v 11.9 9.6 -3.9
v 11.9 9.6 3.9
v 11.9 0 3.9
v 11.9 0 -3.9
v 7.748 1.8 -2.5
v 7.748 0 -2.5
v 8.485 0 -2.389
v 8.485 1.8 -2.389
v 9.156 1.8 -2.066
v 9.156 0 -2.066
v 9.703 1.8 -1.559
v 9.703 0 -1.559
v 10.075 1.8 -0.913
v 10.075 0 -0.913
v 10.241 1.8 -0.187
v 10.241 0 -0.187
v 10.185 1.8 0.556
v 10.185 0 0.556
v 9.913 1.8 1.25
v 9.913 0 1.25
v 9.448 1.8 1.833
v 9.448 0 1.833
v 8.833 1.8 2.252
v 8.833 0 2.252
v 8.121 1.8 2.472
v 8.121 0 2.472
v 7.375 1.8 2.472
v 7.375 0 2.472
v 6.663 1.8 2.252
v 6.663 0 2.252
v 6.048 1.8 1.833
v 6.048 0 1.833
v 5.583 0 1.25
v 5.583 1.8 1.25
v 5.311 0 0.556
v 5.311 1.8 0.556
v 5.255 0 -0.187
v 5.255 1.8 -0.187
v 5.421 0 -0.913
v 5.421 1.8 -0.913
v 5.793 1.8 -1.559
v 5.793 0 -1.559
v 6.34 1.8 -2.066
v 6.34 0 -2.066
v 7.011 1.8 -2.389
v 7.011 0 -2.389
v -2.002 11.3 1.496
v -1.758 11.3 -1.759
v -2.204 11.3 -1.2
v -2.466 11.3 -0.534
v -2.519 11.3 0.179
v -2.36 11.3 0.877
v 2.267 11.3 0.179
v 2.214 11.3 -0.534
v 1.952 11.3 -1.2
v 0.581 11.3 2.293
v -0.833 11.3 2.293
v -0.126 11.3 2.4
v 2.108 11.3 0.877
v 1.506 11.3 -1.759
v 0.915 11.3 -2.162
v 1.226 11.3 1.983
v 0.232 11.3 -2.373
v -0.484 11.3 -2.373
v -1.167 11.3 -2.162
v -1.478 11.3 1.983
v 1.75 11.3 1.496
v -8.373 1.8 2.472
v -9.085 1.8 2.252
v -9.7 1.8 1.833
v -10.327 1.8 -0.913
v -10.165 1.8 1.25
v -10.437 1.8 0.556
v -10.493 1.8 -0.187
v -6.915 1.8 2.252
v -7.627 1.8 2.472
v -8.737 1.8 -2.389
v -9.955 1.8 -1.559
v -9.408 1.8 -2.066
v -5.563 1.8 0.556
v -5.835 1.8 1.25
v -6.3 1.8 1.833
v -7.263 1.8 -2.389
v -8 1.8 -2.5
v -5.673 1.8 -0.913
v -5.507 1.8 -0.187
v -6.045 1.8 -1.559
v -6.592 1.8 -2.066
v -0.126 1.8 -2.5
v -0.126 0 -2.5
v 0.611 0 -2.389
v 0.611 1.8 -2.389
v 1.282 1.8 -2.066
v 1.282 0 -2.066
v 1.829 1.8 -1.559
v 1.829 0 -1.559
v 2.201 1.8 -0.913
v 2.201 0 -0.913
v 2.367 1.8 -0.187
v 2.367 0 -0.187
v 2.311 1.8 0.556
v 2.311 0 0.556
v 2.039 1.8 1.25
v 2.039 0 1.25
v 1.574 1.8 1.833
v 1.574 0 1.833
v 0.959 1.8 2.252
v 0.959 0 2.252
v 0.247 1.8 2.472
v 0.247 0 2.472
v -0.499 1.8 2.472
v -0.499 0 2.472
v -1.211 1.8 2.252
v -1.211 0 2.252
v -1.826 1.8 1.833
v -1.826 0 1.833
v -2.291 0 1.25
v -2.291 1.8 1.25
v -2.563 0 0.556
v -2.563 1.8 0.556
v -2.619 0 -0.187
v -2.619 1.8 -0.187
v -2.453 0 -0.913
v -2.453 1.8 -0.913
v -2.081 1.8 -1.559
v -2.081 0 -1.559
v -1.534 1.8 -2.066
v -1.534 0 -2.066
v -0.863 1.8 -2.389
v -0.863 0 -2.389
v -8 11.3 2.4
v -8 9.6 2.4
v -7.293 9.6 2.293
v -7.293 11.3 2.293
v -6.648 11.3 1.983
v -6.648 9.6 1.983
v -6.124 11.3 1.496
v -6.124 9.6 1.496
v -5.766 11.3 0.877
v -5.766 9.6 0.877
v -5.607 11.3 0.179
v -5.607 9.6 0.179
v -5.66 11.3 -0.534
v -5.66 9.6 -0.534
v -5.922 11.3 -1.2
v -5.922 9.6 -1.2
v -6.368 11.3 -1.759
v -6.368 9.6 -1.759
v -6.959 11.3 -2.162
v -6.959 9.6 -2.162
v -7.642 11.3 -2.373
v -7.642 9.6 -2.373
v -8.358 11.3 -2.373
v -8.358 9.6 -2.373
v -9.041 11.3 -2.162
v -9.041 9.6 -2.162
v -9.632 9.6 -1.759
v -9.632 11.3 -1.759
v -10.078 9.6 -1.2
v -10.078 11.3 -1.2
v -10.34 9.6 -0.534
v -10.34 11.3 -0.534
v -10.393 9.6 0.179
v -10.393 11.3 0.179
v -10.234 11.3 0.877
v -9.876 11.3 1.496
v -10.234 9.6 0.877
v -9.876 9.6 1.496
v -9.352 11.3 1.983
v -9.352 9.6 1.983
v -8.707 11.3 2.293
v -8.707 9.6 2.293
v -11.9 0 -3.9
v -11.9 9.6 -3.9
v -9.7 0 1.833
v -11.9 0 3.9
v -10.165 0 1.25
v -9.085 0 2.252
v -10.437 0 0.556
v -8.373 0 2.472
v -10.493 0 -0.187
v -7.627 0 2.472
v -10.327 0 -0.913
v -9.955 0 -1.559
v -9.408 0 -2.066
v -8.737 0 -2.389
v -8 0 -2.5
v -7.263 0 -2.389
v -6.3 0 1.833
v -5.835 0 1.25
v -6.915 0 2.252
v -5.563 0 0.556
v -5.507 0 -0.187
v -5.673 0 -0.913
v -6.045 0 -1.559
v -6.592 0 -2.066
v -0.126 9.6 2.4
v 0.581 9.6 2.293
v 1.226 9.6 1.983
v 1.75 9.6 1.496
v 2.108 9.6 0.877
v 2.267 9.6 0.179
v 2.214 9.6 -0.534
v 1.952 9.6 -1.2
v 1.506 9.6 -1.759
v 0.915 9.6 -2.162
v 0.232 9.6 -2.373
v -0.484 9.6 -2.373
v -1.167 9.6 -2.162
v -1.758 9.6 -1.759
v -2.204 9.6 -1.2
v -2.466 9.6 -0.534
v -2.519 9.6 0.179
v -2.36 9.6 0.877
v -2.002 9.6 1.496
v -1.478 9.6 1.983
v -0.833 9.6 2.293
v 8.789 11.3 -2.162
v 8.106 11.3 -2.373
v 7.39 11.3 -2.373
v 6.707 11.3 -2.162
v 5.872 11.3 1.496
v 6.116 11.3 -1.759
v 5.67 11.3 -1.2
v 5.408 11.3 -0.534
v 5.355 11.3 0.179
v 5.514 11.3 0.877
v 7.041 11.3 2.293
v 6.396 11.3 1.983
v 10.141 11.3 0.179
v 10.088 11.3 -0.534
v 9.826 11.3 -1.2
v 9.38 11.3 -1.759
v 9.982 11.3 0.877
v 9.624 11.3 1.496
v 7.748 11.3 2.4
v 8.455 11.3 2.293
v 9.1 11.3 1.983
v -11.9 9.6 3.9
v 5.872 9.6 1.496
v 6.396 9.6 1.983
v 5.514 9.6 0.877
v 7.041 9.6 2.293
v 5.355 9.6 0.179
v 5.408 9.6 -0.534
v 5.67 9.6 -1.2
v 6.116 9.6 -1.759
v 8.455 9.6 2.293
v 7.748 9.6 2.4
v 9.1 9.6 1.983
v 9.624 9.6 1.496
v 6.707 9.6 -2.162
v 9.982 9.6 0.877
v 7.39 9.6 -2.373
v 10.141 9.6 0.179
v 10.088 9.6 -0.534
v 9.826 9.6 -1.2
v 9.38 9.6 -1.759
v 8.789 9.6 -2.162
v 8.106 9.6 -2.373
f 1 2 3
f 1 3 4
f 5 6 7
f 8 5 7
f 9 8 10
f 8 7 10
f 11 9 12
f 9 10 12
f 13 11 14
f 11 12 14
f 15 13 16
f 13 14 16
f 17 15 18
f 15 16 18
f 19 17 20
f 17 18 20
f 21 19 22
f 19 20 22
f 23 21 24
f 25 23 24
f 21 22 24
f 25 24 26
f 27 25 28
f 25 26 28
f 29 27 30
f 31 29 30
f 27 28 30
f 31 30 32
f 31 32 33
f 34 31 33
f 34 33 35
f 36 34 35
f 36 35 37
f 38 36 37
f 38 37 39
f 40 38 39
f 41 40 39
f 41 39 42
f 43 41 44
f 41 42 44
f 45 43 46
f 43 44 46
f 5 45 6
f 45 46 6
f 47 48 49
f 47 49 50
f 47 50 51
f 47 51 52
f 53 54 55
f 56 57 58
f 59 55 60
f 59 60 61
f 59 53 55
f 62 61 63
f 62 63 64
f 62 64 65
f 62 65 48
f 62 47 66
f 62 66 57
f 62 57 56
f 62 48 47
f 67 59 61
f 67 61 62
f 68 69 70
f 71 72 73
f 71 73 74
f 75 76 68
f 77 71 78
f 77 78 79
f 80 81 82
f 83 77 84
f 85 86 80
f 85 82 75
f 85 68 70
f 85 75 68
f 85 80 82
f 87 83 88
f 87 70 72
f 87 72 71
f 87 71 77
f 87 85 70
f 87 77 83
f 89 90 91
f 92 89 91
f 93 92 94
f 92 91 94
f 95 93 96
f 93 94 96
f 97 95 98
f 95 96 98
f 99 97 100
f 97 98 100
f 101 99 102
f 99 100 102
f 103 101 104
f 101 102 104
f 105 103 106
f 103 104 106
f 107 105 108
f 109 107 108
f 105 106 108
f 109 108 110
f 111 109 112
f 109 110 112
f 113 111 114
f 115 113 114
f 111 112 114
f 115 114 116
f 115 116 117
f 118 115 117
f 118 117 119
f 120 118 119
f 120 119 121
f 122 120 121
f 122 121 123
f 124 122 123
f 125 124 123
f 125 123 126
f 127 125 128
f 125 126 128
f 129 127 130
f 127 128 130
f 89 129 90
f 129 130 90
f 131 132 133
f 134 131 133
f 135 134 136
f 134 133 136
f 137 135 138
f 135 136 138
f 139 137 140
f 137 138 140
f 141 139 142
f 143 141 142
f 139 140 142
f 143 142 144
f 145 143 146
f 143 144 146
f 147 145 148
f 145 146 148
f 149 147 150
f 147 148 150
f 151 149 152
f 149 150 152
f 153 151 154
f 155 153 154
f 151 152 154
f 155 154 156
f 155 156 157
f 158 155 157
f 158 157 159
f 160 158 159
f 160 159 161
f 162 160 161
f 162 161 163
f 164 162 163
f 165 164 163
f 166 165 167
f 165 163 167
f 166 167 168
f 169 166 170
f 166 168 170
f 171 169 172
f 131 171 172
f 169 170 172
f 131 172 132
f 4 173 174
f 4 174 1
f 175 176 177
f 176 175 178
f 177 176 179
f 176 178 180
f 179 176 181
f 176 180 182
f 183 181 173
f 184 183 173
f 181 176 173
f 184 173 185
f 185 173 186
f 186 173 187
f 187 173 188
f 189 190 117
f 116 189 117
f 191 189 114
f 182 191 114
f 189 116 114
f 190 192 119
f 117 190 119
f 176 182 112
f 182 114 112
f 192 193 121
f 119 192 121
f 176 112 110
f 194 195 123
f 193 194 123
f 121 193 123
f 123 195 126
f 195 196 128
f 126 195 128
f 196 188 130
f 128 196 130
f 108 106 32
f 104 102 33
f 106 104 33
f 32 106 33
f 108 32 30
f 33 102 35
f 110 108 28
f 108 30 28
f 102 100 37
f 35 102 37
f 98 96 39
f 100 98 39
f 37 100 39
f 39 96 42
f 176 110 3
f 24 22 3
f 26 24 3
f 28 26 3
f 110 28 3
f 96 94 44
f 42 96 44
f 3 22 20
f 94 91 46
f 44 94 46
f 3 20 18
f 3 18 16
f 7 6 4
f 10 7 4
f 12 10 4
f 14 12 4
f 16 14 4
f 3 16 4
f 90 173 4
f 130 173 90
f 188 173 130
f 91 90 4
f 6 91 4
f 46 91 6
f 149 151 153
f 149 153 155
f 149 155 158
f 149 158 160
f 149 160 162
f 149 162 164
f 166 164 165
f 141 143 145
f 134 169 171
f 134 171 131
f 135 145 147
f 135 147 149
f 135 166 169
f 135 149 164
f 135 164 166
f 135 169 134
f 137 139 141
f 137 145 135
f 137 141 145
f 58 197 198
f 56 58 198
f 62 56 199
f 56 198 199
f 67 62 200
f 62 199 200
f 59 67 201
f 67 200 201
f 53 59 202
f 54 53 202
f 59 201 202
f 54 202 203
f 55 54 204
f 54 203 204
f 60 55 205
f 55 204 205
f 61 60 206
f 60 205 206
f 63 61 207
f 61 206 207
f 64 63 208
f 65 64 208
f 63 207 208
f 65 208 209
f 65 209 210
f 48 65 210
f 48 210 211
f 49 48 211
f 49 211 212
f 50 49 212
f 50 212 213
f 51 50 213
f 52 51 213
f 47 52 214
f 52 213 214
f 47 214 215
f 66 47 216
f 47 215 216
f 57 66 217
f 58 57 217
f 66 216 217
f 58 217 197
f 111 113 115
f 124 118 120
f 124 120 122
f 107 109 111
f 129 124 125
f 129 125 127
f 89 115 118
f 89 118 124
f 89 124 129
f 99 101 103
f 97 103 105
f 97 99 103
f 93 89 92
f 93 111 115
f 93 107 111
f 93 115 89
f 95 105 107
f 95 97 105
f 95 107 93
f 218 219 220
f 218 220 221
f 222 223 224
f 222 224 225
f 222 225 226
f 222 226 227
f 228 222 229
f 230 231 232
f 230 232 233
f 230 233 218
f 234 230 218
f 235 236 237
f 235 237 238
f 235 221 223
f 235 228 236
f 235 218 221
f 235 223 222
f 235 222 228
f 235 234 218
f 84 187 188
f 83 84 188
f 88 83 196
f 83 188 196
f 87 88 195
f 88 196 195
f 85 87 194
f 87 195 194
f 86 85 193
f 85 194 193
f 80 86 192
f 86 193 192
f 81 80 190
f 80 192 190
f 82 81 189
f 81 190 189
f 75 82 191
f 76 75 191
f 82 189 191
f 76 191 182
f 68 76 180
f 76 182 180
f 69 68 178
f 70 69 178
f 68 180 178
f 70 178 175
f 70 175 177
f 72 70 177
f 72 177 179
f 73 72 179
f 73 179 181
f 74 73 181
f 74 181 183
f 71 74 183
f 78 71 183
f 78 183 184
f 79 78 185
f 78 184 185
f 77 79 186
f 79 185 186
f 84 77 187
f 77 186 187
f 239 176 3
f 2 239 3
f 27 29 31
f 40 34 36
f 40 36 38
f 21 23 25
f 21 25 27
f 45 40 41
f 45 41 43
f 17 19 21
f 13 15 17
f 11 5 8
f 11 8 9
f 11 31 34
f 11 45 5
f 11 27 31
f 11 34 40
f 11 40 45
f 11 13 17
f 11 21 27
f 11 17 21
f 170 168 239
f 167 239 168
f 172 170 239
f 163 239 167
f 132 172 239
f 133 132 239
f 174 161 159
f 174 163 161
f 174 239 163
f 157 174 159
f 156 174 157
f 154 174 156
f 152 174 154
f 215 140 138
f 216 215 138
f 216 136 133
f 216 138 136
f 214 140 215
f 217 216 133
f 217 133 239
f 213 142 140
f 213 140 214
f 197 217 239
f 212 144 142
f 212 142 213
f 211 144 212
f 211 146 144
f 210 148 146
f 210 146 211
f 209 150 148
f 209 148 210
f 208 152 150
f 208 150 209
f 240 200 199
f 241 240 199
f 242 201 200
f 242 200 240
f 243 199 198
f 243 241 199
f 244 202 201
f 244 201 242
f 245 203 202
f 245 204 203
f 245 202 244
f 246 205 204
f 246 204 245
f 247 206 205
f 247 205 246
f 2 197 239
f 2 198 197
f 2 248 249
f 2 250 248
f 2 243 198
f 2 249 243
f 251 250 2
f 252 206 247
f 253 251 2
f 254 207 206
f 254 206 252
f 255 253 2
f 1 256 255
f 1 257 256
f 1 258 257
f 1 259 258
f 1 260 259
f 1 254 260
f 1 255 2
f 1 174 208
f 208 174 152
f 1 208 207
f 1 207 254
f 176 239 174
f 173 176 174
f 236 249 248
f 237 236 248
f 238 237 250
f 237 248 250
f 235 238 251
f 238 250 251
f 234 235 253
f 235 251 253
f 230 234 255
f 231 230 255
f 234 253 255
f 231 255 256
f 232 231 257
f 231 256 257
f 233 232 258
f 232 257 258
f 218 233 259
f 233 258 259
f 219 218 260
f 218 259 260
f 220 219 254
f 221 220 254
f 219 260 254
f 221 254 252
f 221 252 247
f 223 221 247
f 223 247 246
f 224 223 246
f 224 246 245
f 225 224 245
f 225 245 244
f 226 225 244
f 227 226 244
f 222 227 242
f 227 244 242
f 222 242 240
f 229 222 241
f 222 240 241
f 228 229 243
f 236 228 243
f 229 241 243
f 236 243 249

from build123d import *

# Parameters (mm, degrees)
SKETCH_1_W          = 23.8
SKETCH_1_H          = 7.8
EXTRUDE_2_DEPTH     = 9.6
SKETCH_3_R          = 2.4
EXTRUDE_3_DEPTH     = 1.7
SKETCH_4_R          = 2.5
CUT_EXTRUDE_1_DEPTH = 1.8


with BuildPart() as part:
    # Эскиз1 → Бобышка-Вытянуть2 (new body)
    with BuildSketch(Plane(origin=(0, 0, 0), x_dir=(1, 0, 0), z_dir=(0, 1, 0))):
        Rectangle(SKETCH_1_W, SKETCH_1_H)
    extrude(amount=EXTRUDE_2_DEPTH)

    # Эскиз3 → Бобышка-Вытянуть3 (add)
    with BuildSketch(Plane(origin=(0, 9.6, 0), x_dir=(1, 0, 0), z_dir=(0, 1, 0))):
        with Locations(Location((-8, 0, 0), (0, 0, 270))):
            Circle(SKETCH_3_R)
        with Locations(Location((-0.126, 0, 0), (0, 0, 270))):
            Circle(SKETCH_3_R)
        with Locations(Location((7.748, 0, 0), (0, 0, 270))):
            Circle(SKETCH_3_R)
    extrude(amount=EXTRUDE_3_DEPTH)

    # Эскиз4 → Вырез-Вытянуть1 (cut)
    with BuildSketch(Plane.XZ):
        with Locations(Location((-8, 0, 0), (0, 0, 270))):
            Circle(SKETCH_4_R)
        with Locations(Location((-0.126, 0, 0), (0, 0, 270))):
            Circle(SKETCH_4_R)
        with Locations(Location((7.748, 0, 0), (0, 0, 270))):
            Circle(SKETCH_4_R)
    extrude(amount=-CUT_EXTRUDE_1_DEPTH, mode=Mode.SUBTRACT)


solid = part.part
